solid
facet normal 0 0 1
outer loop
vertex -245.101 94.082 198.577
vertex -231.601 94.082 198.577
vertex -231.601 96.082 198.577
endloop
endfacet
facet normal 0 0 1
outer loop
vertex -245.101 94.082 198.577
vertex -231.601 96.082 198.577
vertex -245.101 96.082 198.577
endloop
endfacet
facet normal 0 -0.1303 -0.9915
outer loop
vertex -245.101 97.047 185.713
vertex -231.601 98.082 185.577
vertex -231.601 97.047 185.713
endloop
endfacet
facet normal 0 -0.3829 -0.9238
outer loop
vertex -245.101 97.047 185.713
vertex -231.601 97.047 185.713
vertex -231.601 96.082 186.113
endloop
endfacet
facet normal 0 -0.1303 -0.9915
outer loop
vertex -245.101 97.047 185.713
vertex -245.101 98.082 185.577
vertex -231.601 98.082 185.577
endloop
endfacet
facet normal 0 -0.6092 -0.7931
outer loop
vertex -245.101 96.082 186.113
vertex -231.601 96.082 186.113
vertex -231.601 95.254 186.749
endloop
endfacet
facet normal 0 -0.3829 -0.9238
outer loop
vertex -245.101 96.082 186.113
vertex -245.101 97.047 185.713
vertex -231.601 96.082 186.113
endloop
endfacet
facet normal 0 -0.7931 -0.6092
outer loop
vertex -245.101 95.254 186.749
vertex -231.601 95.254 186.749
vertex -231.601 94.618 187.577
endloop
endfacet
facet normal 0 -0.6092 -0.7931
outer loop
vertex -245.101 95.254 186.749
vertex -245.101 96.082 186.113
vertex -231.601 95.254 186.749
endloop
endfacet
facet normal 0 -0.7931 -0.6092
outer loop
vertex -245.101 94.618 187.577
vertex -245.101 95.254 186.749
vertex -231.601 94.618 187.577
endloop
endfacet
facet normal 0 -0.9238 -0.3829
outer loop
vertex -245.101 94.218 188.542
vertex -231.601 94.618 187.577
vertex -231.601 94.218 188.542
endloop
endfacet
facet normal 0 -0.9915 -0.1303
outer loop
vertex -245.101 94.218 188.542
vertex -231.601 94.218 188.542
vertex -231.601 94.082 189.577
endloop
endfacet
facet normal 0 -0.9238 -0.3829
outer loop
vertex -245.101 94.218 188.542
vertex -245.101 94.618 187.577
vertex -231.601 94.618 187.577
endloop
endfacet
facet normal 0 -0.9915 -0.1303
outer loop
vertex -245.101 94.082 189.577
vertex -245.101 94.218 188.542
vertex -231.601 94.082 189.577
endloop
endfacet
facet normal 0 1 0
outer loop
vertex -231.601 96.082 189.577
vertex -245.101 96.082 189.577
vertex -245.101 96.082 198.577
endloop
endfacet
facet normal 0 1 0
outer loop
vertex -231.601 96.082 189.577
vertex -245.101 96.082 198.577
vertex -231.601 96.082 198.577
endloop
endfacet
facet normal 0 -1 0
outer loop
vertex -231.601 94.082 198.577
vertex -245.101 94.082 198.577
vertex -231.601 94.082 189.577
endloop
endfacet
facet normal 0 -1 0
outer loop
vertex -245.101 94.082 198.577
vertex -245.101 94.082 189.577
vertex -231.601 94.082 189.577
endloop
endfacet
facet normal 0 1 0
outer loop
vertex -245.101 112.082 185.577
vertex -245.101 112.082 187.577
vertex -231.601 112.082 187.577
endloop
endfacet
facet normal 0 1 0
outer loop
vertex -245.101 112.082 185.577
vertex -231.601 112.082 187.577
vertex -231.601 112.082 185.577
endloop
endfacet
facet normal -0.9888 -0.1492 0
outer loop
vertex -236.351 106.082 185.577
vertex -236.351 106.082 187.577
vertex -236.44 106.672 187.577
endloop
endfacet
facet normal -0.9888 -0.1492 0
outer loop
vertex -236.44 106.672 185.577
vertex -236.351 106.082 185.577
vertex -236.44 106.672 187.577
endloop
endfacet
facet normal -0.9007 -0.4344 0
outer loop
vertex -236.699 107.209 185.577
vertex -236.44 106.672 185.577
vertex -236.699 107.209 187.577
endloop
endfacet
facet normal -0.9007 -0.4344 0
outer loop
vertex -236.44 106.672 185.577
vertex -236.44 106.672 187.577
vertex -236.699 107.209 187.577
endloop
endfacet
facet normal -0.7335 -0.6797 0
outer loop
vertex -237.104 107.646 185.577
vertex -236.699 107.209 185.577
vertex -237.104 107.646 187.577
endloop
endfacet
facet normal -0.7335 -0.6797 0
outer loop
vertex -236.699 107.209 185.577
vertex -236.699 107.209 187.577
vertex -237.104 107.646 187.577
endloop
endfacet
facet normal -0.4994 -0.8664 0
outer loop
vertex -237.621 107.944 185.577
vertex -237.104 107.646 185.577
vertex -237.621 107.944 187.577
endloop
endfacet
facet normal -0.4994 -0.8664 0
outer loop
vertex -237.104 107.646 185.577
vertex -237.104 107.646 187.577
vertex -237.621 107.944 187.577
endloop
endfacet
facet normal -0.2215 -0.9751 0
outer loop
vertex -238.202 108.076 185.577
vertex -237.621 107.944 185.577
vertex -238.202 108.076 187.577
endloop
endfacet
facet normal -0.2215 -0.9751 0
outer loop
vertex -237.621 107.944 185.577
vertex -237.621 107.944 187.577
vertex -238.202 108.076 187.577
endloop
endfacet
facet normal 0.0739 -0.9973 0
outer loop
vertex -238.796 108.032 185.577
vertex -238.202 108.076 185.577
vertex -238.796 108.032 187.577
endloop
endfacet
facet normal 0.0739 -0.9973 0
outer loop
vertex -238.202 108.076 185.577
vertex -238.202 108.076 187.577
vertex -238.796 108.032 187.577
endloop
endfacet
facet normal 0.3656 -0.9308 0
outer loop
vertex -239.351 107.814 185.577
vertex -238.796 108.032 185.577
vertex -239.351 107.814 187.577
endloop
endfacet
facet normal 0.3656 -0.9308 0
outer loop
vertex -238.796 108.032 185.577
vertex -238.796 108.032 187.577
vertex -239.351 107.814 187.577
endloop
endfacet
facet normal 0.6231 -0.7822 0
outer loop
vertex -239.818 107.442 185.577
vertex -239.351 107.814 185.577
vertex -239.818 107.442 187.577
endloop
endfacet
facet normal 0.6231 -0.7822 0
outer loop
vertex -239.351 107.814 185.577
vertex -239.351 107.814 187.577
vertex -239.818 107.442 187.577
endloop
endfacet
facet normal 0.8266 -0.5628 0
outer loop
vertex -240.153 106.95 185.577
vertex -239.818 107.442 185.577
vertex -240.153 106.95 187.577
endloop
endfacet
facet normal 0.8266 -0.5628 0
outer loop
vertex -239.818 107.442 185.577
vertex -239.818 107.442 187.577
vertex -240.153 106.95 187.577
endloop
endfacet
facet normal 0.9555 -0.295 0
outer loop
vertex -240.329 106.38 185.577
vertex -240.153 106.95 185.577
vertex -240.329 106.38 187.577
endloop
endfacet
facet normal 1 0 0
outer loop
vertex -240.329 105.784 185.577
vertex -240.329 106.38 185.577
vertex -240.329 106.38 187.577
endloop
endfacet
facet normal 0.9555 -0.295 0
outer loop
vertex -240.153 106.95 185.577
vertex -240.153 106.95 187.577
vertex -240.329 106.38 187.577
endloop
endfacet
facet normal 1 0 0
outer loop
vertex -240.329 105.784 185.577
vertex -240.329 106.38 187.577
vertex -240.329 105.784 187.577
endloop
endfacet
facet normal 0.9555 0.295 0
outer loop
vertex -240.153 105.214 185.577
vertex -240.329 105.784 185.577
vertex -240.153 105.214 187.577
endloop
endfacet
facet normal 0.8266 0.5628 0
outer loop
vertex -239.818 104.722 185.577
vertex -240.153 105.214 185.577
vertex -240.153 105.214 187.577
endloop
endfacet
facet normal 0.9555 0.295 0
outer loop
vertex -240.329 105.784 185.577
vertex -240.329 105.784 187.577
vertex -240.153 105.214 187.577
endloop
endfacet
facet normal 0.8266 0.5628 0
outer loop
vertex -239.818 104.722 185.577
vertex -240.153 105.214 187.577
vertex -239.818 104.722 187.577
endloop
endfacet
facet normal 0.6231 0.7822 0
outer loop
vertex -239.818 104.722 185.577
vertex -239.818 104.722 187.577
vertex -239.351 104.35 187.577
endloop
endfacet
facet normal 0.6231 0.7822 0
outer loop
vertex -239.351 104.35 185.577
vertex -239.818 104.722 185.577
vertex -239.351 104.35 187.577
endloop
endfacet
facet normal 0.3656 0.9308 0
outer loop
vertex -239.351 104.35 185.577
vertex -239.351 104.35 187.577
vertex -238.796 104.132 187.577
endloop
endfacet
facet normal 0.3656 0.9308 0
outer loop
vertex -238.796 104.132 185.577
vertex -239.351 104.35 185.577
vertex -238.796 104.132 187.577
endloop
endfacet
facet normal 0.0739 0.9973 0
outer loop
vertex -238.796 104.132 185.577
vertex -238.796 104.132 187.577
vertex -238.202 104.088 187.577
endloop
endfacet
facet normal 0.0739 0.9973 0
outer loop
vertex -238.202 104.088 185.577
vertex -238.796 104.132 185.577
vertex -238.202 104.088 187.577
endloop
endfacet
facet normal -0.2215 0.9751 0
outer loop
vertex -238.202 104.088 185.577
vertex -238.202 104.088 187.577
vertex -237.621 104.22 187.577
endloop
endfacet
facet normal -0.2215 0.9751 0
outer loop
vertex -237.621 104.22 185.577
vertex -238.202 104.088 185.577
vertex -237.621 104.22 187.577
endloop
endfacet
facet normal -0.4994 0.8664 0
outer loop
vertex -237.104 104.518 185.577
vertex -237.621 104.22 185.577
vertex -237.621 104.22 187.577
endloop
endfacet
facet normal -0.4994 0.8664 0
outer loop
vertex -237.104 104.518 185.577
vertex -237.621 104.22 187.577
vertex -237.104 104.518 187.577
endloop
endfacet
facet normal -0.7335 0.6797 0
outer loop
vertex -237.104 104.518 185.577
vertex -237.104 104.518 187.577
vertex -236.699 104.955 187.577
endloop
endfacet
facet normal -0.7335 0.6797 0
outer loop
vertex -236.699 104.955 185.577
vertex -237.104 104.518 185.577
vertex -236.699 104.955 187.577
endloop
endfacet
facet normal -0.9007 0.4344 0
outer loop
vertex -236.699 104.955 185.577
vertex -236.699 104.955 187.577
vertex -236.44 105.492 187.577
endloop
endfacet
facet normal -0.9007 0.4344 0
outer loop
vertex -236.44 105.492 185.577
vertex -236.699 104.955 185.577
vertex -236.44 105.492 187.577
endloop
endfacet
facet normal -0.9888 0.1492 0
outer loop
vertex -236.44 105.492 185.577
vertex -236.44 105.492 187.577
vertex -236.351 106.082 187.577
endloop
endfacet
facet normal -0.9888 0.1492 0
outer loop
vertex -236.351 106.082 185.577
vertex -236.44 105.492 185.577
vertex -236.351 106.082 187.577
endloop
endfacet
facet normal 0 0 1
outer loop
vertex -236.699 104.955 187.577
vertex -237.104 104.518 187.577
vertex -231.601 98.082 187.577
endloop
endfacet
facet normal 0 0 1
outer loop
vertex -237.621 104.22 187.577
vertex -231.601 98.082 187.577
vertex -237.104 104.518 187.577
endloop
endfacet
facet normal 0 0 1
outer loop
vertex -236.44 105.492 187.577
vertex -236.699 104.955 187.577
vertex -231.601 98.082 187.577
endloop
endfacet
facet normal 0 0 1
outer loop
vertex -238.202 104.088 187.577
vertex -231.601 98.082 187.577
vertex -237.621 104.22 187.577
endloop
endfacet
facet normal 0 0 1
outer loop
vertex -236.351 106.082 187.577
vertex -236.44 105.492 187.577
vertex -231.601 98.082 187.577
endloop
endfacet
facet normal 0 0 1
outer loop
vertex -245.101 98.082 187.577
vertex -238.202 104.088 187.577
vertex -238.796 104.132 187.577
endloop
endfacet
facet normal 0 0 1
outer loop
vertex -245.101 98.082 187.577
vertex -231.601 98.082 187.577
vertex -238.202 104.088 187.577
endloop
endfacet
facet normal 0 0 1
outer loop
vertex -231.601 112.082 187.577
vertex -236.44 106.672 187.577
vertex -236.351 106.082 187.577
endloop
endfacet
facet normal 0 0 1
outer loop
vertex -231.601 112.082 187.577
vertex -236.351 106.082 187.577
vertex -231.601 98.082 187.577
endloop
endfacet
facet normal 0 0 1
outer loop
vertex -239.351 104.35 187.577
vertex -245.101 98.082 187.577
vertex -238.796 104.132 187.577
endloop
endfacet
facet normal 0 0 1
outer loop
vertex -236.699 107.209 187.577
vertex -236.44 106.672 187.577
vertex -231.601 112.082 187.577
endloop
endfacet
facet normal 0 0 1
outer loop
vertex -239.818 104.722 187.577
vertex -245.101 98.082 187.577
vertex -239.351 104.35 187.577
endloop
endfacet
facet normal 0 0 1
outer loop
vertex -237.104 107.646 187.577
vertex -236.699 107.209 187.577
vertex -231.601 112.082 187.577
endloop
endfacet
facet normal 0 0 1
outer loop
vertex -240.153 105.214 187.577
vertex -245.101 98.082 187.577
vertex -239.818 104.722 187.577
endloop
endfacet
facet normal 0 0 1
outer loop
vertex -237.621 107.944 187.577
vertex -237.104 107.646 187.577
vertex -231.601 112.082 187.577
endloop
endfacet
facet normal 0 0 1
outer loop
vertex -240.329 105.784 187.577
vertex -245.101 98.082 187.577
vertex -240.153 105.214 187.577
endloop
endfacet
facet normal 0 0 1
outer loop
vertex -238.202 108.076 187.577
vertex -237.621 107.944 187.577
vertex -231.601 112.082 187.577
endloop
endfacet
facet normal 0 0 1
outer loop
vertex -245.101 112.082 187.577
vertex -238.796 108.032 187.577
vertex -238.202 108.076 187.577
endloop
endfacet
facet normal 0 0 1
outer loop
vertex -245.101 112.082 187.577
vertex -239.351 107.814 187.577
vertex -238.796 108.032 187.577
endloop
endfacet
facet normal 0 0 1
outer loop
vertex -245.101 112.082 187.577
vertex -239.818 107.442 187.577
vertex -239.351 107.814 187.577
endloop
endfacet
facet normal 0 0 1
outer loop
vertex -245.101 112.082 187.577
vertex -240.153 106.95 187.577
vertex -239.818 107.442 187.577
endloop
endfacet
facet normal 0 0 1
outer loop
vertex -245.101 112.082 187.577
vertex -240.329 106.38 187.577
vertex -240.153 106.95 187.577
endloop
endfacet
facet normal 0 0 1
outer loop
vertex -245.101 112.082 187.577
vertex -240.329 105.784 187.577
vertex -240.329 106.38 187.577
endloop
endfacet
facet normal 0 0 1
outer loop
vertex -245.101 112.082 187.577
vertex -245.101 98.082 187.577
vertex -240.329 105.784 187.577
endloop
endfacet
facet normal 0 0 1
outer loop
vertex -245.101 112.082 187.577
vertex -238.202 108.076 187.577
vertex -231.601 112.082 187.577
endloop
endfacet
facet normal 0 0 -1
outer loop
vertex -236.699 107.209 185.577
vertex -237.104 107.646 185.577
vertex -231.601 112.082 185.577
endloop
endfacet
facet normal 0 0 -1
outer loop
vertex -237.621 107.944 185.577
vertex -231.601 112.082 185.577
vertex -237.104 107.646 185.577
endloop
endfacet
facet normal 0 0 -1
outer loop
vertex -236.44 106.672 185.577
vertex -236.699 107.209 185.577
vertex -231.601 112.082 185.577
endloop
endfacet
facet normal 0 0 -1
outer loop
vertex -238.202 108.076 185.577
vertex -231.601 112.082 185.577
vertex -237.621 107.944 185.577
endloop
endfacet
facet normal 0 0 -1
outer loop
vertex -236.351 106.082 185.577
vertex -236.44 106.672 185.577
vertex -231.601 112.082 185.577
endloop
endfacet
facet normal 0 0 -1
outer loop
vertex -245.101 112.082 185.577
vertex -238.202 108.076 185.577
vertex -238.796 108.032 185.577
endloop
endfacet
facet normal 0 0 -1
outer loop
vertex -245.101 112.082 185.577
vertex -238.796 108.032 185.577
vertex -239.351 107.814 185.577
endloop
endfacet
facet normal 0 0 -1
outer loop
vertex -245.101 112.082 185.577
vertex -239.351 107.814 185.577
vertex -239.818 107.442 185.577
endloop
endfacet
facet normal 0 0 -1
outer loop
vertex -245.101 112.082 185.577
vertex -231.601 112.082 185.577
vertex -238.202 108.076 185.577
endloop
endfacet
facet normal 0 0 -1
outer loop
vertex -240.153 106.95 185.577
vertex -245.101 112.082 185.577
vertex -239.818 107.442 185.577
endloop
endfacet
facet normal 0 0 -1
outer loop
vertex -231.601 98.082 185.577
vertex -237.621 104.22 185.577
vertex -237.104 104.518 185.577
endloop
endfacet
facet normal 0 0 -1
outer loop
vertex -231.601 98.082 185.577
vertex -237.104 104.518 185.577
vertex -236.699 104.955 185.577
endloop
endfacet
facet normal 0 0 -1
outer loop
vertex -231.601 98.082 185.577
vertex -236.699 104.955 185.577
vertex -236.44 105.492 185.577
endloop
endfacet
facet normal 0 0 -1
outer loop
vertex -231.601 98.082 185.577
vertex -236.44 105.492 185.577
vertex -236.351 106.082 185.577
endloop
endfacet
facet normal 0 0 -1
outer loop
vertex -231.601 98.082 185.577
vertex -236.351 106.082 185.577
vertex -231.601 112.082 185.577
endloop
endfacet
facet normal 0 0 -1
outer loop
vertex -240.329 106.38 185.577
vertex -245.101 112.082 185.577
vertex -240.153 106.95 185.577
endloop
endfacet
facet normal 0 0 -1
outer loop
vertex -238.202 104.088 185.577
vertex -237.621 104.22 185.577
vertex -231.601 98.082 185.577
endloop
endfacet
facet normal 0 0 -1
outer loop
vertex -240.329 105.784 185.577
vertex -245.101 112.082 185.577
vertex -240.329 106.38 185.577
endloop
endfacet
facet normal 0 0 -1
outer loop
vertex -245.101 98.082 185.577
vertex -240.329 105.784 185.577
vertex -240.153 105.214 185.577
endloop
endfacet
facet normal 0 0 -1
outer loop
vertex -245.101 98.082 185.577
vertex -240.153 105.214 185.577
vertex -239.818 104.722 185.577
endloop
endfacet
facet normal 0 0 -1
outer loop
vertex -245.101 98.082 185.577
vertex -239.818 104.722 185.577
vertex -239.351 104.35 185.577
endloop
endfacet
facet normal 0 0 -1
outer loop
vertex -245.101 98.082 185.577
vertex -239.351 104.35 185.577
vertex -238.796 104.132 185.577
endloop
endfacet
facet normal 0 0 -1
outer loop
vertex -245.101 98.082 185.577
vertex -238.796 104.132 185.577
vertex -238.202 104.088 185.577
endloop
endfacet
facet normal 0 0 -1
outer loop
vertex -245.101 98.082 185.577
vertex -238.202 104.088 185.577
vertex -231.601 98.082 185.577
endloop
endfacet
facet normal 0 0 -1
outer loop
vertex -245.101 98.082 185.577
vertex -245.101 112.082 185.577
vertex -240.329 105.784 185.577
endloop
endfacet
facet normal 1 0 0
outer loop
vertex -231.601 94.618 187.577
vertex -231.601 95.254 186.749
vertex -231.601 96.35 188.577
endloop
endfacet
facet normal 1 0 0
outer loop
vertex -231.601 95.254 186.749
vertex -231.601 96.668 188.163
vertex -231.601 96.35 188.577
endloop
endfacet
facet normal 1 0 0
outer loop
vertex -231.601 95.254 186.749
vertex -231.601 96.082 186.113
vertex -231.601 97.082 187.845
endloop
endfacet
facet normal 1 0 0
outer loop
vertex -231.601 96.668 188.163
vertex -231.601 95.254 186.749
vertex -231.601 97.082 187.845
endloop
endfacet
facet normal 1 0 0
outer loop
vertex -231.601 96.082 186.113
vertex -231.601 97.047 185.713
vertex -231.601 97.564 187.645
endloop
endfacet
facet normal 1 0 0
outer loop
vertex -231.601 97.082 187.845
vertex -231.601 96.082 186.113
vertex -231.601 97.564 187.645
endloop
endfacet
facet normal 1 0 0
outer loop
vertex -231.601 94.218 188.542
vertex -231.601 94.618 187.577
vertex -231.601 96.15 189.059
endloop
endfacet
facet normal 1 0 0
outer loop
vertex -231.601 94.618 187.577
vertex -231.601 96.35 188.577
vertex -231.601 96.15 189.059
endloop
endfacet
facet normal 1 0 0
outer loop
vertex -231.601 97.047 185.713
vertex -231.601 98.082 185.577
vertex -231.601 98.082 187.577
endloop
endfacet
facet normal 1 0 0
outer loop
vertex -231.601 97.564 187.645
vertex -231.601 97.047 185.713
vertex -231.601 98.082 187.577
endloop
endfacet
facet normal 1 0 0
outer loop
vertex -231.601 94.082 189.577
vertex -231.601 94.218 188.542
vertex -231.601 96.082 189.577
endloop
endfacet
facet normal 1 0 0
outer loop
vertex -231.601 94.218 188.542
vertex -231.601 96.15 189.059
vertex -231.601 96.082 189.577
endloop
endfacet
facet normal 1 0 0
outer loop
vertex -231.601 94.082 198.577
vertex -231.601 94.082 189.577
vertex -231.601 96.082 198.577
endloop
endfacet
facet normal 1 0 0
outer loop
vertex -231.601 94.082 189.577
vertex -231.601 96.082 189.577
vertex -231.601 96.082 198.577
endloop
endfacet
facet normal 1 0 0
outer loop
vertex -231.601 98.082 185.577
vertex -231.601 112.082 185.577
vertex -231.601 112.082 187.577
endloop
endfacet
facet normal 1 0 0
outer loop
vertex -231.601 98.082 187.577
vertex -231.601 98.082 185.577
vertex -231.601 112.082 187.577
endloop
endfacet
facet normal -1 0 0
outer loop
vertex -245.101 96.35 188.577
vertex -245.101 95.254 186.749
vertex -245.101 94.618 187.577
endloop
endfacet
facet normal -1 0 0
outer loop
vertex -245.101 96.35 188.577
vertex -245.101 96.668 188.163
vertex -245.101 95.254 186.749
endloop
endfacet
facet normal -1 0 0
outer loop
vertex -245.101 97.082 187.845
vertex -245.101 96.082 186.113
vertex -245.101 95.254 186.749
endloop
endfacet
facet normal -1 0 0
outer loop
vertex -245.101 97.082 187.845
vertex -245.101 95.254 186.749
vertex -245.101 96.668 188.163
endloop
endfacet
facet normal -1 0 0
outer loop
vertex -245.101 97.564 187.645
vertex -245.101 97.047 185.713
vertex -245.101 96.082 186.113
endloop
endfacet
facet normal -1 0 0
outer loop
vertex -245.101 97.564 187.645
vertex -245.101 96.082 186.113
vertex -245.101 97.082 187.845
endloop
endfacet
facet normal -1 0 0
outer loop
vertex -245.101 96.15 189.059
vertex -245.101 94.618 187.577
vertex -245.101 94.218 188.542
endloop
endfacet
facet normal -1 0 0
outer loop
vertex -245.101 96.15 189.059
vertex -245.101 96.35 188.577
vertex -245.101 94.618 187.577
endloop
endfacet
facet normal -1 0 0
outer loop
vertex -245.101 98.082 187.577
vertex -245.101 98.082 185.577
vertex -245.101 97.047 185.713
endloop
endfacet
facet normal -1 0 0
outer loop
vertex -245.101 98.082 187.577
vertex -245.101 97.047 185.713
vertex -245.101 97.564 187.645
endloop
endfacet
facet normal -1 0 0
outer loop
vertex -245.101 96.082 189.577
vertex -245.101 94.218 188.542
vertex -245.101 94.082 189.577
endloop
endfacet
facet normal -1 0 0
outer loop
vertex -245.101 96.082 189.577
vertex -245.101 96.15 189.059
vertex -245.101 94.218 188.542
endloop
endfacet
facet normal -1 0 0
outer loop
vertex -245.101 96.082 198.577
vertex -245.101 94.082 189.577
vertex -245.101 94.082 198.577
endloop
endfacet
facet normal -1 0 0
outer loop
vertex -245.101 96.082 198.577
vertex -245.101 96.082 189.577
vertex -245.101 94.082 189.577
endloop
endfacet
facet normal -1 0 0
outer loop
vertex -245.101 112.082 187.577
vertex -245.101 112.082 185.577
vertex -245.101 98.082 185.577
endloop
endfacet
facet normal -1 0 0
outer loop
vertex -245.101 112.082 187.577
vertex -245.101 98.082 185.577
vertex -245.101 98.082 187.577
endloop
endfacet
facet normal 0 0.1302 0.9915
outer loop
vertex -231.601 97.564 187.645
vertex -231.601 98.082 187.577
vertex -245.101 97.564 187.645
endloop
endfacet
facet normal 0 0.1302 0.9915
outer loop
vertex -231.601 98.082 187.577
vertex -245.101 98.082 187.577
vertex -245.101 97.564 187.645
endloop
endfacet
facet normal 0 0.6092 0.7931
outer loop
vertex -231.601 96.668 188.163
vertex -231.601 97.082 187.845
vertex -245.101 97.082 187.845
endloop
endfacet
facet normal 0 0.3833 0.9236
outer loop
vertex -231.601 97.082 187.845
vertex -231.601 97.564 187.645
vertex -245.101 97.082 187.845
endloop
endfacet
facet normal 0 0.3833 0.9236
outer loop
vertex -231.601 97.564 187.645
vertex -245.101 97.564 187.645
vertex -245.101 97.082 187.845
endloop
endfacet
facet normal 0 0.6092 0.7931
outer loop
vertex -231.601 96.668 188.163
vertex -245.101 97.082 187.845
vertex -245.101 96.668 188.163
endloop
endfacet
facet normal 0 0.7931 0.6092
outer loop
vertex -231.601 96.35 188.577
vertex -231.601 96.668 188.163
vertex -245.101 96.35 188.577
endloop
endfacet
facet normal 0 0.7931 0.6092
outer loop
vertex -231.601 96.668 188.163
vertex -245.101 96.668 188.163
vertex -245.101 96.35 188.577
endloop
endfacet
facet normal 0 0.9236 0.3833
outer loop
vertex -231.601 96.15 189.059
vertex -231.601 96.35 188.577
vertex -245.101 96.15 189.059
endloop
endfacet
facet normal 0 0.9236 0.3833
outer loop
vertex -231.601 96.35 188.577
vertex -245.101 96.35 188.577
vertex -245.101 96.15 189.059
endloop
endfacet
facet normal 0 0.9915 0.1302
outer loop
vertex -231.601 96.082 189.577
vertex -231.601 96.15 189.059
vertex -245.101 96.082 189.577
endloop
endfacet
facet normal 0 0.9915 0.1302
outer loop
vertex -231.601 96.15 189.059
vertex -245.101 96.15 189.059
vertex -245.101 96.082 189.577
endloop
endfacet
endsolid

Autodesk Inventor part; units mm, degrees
ref_plane "YZ Plane" through (0, 0, 0) normal (1, 0, 0) x (0, 1, 0)
ref_plane "XZ Plane" through (0, 0, 0) normal (0, 1, 0) x (-1, 0, 0)
ref_plane "Work Plane1" through (-238.4764, 94.082, 198.5771) normal (0, 1, 0) x (-1, 0, 0)
ref_plane "Work Plane2" through (-231.6014, 94.082, 198.5771) normal (0, 1, 0) x (1, 0, 0)
sketch "Sketch1" plane through (-231.6014, 94.082, 198.5771) normal (0, 1, 0) x (1, 0, 0)
  line L0 (-13.5, 2) -> (0, 2) projected
  line L1 (-13.5, 0) -> (-13.5, 2) projected
  line L2 (0, 0) -> (-13.5, 0) projected
  line L3 (0, 0) -> (0, 2) projected
  line L4 (-13.5, 0) -> (0, 0)
  line L5 (0, 0) -> (0, 13)
  line L6 (0, 13) -> (-13.5, 13)
  line L7 (-13.5, 13) -> (-13.5, 0)
  point P0 (231.6014, 198.5771)
  point P1 (0, 2)
  dimension "d0" = 13
extrude "Extrusion1" add sketch "Sketch1" along normal blind 2
ref_plane "Work Plane3" through (-238.3514, 112.082, 188.5771) normal (0, 1, 0) x (1, 0, 0)
sketch "Sketch2" plane through (-238.3514, 112.082, 188.5771) normal (0, 1, 0) x (1, 0, 0)
  line L0 (-10, 0) -> (10, 0)
  point P0 (238.3514, 188.5771)
sketch "Sketch3" plane through (-245.1014, 94.082, 187.5771) normal (0, 0, -1) x (-1, 0, 0)
  line L0 (-13.5, 0) -> (0, 0)
  line L1 (0, 0) -> (0, 18)
  line L2 (0, 18) -> (-13.5, 18)
  line L3 (-13.5, 18) -> (-13.5, 0)
edge flange "Flange1" height 18 angle 90 thickness 2 bend radius 2 thickness toward (0, 0, -1) relief tear relief width 2 relief depth 1 edges at (-238.3514, 96.082, 185.5771) wall of the first edge with corners at (-231.6014, 94.082, 187.5771) (-245.1014, 94.082, 187.5771) (-245.1014, 112.082, 187.5771) (-231.6014, 112.082, 187.5771)
bend "Bend1"
corner "Corner1"
sketch "Sketch4" plane through (-245.1014, 112.082, 187.5771) normal (0, 0, 1) x (1, 0, 0)
  circle A0 centre (6.75, -6) radius 2
  line L0 (13.5, 0) -> (0, 0) projected
  line L1 (6.75, 0) -> (6.75, -8.3247) construction
  point P0 (245.1014, -112.082)
  point P1 (6.75, -4)
  dimension "d14" = 4
  dimension "d15" = 4
extrude "Extrusion2" cut sketch "Sketch4" against normal through all
equation "\"d3\" = Thickness"
equation "\"d4\" = BendReliefWidth"
equation "\"d5\" = BendReliefDepth"
equation "\"d6\" = MinimumRemnant"
equation "\"d7\" = TransitionRadius"
equation "\"d10\" = BendRadius"
equation "\"d11\" = CornerReliefSize"
equation "\"d12\" = GapSize"
equation "\"d13\" = JacobiRadiusSize"
equation "\"BendRadius\" = Thickness"
equation "\"BendReliefWidth\" = Thickness"
equation "\"BendReliefDepth\" = 0.5 * Thickness"
equation "\"CornerReliefSize\" = 4 * Thickness"
equation "\"MinimumRemnant\" = 2 * Thickness"
equation "\"TransitionRadius\" = BendRadius"
equation "\"JacobiRadiusSize\" = BendRadius"
equation "\"GapSize\" = Thickness"
equation "\"Thickness\" = 2"
properties part number "BackWheelMountingPlate" material "Steel, Alloy"
